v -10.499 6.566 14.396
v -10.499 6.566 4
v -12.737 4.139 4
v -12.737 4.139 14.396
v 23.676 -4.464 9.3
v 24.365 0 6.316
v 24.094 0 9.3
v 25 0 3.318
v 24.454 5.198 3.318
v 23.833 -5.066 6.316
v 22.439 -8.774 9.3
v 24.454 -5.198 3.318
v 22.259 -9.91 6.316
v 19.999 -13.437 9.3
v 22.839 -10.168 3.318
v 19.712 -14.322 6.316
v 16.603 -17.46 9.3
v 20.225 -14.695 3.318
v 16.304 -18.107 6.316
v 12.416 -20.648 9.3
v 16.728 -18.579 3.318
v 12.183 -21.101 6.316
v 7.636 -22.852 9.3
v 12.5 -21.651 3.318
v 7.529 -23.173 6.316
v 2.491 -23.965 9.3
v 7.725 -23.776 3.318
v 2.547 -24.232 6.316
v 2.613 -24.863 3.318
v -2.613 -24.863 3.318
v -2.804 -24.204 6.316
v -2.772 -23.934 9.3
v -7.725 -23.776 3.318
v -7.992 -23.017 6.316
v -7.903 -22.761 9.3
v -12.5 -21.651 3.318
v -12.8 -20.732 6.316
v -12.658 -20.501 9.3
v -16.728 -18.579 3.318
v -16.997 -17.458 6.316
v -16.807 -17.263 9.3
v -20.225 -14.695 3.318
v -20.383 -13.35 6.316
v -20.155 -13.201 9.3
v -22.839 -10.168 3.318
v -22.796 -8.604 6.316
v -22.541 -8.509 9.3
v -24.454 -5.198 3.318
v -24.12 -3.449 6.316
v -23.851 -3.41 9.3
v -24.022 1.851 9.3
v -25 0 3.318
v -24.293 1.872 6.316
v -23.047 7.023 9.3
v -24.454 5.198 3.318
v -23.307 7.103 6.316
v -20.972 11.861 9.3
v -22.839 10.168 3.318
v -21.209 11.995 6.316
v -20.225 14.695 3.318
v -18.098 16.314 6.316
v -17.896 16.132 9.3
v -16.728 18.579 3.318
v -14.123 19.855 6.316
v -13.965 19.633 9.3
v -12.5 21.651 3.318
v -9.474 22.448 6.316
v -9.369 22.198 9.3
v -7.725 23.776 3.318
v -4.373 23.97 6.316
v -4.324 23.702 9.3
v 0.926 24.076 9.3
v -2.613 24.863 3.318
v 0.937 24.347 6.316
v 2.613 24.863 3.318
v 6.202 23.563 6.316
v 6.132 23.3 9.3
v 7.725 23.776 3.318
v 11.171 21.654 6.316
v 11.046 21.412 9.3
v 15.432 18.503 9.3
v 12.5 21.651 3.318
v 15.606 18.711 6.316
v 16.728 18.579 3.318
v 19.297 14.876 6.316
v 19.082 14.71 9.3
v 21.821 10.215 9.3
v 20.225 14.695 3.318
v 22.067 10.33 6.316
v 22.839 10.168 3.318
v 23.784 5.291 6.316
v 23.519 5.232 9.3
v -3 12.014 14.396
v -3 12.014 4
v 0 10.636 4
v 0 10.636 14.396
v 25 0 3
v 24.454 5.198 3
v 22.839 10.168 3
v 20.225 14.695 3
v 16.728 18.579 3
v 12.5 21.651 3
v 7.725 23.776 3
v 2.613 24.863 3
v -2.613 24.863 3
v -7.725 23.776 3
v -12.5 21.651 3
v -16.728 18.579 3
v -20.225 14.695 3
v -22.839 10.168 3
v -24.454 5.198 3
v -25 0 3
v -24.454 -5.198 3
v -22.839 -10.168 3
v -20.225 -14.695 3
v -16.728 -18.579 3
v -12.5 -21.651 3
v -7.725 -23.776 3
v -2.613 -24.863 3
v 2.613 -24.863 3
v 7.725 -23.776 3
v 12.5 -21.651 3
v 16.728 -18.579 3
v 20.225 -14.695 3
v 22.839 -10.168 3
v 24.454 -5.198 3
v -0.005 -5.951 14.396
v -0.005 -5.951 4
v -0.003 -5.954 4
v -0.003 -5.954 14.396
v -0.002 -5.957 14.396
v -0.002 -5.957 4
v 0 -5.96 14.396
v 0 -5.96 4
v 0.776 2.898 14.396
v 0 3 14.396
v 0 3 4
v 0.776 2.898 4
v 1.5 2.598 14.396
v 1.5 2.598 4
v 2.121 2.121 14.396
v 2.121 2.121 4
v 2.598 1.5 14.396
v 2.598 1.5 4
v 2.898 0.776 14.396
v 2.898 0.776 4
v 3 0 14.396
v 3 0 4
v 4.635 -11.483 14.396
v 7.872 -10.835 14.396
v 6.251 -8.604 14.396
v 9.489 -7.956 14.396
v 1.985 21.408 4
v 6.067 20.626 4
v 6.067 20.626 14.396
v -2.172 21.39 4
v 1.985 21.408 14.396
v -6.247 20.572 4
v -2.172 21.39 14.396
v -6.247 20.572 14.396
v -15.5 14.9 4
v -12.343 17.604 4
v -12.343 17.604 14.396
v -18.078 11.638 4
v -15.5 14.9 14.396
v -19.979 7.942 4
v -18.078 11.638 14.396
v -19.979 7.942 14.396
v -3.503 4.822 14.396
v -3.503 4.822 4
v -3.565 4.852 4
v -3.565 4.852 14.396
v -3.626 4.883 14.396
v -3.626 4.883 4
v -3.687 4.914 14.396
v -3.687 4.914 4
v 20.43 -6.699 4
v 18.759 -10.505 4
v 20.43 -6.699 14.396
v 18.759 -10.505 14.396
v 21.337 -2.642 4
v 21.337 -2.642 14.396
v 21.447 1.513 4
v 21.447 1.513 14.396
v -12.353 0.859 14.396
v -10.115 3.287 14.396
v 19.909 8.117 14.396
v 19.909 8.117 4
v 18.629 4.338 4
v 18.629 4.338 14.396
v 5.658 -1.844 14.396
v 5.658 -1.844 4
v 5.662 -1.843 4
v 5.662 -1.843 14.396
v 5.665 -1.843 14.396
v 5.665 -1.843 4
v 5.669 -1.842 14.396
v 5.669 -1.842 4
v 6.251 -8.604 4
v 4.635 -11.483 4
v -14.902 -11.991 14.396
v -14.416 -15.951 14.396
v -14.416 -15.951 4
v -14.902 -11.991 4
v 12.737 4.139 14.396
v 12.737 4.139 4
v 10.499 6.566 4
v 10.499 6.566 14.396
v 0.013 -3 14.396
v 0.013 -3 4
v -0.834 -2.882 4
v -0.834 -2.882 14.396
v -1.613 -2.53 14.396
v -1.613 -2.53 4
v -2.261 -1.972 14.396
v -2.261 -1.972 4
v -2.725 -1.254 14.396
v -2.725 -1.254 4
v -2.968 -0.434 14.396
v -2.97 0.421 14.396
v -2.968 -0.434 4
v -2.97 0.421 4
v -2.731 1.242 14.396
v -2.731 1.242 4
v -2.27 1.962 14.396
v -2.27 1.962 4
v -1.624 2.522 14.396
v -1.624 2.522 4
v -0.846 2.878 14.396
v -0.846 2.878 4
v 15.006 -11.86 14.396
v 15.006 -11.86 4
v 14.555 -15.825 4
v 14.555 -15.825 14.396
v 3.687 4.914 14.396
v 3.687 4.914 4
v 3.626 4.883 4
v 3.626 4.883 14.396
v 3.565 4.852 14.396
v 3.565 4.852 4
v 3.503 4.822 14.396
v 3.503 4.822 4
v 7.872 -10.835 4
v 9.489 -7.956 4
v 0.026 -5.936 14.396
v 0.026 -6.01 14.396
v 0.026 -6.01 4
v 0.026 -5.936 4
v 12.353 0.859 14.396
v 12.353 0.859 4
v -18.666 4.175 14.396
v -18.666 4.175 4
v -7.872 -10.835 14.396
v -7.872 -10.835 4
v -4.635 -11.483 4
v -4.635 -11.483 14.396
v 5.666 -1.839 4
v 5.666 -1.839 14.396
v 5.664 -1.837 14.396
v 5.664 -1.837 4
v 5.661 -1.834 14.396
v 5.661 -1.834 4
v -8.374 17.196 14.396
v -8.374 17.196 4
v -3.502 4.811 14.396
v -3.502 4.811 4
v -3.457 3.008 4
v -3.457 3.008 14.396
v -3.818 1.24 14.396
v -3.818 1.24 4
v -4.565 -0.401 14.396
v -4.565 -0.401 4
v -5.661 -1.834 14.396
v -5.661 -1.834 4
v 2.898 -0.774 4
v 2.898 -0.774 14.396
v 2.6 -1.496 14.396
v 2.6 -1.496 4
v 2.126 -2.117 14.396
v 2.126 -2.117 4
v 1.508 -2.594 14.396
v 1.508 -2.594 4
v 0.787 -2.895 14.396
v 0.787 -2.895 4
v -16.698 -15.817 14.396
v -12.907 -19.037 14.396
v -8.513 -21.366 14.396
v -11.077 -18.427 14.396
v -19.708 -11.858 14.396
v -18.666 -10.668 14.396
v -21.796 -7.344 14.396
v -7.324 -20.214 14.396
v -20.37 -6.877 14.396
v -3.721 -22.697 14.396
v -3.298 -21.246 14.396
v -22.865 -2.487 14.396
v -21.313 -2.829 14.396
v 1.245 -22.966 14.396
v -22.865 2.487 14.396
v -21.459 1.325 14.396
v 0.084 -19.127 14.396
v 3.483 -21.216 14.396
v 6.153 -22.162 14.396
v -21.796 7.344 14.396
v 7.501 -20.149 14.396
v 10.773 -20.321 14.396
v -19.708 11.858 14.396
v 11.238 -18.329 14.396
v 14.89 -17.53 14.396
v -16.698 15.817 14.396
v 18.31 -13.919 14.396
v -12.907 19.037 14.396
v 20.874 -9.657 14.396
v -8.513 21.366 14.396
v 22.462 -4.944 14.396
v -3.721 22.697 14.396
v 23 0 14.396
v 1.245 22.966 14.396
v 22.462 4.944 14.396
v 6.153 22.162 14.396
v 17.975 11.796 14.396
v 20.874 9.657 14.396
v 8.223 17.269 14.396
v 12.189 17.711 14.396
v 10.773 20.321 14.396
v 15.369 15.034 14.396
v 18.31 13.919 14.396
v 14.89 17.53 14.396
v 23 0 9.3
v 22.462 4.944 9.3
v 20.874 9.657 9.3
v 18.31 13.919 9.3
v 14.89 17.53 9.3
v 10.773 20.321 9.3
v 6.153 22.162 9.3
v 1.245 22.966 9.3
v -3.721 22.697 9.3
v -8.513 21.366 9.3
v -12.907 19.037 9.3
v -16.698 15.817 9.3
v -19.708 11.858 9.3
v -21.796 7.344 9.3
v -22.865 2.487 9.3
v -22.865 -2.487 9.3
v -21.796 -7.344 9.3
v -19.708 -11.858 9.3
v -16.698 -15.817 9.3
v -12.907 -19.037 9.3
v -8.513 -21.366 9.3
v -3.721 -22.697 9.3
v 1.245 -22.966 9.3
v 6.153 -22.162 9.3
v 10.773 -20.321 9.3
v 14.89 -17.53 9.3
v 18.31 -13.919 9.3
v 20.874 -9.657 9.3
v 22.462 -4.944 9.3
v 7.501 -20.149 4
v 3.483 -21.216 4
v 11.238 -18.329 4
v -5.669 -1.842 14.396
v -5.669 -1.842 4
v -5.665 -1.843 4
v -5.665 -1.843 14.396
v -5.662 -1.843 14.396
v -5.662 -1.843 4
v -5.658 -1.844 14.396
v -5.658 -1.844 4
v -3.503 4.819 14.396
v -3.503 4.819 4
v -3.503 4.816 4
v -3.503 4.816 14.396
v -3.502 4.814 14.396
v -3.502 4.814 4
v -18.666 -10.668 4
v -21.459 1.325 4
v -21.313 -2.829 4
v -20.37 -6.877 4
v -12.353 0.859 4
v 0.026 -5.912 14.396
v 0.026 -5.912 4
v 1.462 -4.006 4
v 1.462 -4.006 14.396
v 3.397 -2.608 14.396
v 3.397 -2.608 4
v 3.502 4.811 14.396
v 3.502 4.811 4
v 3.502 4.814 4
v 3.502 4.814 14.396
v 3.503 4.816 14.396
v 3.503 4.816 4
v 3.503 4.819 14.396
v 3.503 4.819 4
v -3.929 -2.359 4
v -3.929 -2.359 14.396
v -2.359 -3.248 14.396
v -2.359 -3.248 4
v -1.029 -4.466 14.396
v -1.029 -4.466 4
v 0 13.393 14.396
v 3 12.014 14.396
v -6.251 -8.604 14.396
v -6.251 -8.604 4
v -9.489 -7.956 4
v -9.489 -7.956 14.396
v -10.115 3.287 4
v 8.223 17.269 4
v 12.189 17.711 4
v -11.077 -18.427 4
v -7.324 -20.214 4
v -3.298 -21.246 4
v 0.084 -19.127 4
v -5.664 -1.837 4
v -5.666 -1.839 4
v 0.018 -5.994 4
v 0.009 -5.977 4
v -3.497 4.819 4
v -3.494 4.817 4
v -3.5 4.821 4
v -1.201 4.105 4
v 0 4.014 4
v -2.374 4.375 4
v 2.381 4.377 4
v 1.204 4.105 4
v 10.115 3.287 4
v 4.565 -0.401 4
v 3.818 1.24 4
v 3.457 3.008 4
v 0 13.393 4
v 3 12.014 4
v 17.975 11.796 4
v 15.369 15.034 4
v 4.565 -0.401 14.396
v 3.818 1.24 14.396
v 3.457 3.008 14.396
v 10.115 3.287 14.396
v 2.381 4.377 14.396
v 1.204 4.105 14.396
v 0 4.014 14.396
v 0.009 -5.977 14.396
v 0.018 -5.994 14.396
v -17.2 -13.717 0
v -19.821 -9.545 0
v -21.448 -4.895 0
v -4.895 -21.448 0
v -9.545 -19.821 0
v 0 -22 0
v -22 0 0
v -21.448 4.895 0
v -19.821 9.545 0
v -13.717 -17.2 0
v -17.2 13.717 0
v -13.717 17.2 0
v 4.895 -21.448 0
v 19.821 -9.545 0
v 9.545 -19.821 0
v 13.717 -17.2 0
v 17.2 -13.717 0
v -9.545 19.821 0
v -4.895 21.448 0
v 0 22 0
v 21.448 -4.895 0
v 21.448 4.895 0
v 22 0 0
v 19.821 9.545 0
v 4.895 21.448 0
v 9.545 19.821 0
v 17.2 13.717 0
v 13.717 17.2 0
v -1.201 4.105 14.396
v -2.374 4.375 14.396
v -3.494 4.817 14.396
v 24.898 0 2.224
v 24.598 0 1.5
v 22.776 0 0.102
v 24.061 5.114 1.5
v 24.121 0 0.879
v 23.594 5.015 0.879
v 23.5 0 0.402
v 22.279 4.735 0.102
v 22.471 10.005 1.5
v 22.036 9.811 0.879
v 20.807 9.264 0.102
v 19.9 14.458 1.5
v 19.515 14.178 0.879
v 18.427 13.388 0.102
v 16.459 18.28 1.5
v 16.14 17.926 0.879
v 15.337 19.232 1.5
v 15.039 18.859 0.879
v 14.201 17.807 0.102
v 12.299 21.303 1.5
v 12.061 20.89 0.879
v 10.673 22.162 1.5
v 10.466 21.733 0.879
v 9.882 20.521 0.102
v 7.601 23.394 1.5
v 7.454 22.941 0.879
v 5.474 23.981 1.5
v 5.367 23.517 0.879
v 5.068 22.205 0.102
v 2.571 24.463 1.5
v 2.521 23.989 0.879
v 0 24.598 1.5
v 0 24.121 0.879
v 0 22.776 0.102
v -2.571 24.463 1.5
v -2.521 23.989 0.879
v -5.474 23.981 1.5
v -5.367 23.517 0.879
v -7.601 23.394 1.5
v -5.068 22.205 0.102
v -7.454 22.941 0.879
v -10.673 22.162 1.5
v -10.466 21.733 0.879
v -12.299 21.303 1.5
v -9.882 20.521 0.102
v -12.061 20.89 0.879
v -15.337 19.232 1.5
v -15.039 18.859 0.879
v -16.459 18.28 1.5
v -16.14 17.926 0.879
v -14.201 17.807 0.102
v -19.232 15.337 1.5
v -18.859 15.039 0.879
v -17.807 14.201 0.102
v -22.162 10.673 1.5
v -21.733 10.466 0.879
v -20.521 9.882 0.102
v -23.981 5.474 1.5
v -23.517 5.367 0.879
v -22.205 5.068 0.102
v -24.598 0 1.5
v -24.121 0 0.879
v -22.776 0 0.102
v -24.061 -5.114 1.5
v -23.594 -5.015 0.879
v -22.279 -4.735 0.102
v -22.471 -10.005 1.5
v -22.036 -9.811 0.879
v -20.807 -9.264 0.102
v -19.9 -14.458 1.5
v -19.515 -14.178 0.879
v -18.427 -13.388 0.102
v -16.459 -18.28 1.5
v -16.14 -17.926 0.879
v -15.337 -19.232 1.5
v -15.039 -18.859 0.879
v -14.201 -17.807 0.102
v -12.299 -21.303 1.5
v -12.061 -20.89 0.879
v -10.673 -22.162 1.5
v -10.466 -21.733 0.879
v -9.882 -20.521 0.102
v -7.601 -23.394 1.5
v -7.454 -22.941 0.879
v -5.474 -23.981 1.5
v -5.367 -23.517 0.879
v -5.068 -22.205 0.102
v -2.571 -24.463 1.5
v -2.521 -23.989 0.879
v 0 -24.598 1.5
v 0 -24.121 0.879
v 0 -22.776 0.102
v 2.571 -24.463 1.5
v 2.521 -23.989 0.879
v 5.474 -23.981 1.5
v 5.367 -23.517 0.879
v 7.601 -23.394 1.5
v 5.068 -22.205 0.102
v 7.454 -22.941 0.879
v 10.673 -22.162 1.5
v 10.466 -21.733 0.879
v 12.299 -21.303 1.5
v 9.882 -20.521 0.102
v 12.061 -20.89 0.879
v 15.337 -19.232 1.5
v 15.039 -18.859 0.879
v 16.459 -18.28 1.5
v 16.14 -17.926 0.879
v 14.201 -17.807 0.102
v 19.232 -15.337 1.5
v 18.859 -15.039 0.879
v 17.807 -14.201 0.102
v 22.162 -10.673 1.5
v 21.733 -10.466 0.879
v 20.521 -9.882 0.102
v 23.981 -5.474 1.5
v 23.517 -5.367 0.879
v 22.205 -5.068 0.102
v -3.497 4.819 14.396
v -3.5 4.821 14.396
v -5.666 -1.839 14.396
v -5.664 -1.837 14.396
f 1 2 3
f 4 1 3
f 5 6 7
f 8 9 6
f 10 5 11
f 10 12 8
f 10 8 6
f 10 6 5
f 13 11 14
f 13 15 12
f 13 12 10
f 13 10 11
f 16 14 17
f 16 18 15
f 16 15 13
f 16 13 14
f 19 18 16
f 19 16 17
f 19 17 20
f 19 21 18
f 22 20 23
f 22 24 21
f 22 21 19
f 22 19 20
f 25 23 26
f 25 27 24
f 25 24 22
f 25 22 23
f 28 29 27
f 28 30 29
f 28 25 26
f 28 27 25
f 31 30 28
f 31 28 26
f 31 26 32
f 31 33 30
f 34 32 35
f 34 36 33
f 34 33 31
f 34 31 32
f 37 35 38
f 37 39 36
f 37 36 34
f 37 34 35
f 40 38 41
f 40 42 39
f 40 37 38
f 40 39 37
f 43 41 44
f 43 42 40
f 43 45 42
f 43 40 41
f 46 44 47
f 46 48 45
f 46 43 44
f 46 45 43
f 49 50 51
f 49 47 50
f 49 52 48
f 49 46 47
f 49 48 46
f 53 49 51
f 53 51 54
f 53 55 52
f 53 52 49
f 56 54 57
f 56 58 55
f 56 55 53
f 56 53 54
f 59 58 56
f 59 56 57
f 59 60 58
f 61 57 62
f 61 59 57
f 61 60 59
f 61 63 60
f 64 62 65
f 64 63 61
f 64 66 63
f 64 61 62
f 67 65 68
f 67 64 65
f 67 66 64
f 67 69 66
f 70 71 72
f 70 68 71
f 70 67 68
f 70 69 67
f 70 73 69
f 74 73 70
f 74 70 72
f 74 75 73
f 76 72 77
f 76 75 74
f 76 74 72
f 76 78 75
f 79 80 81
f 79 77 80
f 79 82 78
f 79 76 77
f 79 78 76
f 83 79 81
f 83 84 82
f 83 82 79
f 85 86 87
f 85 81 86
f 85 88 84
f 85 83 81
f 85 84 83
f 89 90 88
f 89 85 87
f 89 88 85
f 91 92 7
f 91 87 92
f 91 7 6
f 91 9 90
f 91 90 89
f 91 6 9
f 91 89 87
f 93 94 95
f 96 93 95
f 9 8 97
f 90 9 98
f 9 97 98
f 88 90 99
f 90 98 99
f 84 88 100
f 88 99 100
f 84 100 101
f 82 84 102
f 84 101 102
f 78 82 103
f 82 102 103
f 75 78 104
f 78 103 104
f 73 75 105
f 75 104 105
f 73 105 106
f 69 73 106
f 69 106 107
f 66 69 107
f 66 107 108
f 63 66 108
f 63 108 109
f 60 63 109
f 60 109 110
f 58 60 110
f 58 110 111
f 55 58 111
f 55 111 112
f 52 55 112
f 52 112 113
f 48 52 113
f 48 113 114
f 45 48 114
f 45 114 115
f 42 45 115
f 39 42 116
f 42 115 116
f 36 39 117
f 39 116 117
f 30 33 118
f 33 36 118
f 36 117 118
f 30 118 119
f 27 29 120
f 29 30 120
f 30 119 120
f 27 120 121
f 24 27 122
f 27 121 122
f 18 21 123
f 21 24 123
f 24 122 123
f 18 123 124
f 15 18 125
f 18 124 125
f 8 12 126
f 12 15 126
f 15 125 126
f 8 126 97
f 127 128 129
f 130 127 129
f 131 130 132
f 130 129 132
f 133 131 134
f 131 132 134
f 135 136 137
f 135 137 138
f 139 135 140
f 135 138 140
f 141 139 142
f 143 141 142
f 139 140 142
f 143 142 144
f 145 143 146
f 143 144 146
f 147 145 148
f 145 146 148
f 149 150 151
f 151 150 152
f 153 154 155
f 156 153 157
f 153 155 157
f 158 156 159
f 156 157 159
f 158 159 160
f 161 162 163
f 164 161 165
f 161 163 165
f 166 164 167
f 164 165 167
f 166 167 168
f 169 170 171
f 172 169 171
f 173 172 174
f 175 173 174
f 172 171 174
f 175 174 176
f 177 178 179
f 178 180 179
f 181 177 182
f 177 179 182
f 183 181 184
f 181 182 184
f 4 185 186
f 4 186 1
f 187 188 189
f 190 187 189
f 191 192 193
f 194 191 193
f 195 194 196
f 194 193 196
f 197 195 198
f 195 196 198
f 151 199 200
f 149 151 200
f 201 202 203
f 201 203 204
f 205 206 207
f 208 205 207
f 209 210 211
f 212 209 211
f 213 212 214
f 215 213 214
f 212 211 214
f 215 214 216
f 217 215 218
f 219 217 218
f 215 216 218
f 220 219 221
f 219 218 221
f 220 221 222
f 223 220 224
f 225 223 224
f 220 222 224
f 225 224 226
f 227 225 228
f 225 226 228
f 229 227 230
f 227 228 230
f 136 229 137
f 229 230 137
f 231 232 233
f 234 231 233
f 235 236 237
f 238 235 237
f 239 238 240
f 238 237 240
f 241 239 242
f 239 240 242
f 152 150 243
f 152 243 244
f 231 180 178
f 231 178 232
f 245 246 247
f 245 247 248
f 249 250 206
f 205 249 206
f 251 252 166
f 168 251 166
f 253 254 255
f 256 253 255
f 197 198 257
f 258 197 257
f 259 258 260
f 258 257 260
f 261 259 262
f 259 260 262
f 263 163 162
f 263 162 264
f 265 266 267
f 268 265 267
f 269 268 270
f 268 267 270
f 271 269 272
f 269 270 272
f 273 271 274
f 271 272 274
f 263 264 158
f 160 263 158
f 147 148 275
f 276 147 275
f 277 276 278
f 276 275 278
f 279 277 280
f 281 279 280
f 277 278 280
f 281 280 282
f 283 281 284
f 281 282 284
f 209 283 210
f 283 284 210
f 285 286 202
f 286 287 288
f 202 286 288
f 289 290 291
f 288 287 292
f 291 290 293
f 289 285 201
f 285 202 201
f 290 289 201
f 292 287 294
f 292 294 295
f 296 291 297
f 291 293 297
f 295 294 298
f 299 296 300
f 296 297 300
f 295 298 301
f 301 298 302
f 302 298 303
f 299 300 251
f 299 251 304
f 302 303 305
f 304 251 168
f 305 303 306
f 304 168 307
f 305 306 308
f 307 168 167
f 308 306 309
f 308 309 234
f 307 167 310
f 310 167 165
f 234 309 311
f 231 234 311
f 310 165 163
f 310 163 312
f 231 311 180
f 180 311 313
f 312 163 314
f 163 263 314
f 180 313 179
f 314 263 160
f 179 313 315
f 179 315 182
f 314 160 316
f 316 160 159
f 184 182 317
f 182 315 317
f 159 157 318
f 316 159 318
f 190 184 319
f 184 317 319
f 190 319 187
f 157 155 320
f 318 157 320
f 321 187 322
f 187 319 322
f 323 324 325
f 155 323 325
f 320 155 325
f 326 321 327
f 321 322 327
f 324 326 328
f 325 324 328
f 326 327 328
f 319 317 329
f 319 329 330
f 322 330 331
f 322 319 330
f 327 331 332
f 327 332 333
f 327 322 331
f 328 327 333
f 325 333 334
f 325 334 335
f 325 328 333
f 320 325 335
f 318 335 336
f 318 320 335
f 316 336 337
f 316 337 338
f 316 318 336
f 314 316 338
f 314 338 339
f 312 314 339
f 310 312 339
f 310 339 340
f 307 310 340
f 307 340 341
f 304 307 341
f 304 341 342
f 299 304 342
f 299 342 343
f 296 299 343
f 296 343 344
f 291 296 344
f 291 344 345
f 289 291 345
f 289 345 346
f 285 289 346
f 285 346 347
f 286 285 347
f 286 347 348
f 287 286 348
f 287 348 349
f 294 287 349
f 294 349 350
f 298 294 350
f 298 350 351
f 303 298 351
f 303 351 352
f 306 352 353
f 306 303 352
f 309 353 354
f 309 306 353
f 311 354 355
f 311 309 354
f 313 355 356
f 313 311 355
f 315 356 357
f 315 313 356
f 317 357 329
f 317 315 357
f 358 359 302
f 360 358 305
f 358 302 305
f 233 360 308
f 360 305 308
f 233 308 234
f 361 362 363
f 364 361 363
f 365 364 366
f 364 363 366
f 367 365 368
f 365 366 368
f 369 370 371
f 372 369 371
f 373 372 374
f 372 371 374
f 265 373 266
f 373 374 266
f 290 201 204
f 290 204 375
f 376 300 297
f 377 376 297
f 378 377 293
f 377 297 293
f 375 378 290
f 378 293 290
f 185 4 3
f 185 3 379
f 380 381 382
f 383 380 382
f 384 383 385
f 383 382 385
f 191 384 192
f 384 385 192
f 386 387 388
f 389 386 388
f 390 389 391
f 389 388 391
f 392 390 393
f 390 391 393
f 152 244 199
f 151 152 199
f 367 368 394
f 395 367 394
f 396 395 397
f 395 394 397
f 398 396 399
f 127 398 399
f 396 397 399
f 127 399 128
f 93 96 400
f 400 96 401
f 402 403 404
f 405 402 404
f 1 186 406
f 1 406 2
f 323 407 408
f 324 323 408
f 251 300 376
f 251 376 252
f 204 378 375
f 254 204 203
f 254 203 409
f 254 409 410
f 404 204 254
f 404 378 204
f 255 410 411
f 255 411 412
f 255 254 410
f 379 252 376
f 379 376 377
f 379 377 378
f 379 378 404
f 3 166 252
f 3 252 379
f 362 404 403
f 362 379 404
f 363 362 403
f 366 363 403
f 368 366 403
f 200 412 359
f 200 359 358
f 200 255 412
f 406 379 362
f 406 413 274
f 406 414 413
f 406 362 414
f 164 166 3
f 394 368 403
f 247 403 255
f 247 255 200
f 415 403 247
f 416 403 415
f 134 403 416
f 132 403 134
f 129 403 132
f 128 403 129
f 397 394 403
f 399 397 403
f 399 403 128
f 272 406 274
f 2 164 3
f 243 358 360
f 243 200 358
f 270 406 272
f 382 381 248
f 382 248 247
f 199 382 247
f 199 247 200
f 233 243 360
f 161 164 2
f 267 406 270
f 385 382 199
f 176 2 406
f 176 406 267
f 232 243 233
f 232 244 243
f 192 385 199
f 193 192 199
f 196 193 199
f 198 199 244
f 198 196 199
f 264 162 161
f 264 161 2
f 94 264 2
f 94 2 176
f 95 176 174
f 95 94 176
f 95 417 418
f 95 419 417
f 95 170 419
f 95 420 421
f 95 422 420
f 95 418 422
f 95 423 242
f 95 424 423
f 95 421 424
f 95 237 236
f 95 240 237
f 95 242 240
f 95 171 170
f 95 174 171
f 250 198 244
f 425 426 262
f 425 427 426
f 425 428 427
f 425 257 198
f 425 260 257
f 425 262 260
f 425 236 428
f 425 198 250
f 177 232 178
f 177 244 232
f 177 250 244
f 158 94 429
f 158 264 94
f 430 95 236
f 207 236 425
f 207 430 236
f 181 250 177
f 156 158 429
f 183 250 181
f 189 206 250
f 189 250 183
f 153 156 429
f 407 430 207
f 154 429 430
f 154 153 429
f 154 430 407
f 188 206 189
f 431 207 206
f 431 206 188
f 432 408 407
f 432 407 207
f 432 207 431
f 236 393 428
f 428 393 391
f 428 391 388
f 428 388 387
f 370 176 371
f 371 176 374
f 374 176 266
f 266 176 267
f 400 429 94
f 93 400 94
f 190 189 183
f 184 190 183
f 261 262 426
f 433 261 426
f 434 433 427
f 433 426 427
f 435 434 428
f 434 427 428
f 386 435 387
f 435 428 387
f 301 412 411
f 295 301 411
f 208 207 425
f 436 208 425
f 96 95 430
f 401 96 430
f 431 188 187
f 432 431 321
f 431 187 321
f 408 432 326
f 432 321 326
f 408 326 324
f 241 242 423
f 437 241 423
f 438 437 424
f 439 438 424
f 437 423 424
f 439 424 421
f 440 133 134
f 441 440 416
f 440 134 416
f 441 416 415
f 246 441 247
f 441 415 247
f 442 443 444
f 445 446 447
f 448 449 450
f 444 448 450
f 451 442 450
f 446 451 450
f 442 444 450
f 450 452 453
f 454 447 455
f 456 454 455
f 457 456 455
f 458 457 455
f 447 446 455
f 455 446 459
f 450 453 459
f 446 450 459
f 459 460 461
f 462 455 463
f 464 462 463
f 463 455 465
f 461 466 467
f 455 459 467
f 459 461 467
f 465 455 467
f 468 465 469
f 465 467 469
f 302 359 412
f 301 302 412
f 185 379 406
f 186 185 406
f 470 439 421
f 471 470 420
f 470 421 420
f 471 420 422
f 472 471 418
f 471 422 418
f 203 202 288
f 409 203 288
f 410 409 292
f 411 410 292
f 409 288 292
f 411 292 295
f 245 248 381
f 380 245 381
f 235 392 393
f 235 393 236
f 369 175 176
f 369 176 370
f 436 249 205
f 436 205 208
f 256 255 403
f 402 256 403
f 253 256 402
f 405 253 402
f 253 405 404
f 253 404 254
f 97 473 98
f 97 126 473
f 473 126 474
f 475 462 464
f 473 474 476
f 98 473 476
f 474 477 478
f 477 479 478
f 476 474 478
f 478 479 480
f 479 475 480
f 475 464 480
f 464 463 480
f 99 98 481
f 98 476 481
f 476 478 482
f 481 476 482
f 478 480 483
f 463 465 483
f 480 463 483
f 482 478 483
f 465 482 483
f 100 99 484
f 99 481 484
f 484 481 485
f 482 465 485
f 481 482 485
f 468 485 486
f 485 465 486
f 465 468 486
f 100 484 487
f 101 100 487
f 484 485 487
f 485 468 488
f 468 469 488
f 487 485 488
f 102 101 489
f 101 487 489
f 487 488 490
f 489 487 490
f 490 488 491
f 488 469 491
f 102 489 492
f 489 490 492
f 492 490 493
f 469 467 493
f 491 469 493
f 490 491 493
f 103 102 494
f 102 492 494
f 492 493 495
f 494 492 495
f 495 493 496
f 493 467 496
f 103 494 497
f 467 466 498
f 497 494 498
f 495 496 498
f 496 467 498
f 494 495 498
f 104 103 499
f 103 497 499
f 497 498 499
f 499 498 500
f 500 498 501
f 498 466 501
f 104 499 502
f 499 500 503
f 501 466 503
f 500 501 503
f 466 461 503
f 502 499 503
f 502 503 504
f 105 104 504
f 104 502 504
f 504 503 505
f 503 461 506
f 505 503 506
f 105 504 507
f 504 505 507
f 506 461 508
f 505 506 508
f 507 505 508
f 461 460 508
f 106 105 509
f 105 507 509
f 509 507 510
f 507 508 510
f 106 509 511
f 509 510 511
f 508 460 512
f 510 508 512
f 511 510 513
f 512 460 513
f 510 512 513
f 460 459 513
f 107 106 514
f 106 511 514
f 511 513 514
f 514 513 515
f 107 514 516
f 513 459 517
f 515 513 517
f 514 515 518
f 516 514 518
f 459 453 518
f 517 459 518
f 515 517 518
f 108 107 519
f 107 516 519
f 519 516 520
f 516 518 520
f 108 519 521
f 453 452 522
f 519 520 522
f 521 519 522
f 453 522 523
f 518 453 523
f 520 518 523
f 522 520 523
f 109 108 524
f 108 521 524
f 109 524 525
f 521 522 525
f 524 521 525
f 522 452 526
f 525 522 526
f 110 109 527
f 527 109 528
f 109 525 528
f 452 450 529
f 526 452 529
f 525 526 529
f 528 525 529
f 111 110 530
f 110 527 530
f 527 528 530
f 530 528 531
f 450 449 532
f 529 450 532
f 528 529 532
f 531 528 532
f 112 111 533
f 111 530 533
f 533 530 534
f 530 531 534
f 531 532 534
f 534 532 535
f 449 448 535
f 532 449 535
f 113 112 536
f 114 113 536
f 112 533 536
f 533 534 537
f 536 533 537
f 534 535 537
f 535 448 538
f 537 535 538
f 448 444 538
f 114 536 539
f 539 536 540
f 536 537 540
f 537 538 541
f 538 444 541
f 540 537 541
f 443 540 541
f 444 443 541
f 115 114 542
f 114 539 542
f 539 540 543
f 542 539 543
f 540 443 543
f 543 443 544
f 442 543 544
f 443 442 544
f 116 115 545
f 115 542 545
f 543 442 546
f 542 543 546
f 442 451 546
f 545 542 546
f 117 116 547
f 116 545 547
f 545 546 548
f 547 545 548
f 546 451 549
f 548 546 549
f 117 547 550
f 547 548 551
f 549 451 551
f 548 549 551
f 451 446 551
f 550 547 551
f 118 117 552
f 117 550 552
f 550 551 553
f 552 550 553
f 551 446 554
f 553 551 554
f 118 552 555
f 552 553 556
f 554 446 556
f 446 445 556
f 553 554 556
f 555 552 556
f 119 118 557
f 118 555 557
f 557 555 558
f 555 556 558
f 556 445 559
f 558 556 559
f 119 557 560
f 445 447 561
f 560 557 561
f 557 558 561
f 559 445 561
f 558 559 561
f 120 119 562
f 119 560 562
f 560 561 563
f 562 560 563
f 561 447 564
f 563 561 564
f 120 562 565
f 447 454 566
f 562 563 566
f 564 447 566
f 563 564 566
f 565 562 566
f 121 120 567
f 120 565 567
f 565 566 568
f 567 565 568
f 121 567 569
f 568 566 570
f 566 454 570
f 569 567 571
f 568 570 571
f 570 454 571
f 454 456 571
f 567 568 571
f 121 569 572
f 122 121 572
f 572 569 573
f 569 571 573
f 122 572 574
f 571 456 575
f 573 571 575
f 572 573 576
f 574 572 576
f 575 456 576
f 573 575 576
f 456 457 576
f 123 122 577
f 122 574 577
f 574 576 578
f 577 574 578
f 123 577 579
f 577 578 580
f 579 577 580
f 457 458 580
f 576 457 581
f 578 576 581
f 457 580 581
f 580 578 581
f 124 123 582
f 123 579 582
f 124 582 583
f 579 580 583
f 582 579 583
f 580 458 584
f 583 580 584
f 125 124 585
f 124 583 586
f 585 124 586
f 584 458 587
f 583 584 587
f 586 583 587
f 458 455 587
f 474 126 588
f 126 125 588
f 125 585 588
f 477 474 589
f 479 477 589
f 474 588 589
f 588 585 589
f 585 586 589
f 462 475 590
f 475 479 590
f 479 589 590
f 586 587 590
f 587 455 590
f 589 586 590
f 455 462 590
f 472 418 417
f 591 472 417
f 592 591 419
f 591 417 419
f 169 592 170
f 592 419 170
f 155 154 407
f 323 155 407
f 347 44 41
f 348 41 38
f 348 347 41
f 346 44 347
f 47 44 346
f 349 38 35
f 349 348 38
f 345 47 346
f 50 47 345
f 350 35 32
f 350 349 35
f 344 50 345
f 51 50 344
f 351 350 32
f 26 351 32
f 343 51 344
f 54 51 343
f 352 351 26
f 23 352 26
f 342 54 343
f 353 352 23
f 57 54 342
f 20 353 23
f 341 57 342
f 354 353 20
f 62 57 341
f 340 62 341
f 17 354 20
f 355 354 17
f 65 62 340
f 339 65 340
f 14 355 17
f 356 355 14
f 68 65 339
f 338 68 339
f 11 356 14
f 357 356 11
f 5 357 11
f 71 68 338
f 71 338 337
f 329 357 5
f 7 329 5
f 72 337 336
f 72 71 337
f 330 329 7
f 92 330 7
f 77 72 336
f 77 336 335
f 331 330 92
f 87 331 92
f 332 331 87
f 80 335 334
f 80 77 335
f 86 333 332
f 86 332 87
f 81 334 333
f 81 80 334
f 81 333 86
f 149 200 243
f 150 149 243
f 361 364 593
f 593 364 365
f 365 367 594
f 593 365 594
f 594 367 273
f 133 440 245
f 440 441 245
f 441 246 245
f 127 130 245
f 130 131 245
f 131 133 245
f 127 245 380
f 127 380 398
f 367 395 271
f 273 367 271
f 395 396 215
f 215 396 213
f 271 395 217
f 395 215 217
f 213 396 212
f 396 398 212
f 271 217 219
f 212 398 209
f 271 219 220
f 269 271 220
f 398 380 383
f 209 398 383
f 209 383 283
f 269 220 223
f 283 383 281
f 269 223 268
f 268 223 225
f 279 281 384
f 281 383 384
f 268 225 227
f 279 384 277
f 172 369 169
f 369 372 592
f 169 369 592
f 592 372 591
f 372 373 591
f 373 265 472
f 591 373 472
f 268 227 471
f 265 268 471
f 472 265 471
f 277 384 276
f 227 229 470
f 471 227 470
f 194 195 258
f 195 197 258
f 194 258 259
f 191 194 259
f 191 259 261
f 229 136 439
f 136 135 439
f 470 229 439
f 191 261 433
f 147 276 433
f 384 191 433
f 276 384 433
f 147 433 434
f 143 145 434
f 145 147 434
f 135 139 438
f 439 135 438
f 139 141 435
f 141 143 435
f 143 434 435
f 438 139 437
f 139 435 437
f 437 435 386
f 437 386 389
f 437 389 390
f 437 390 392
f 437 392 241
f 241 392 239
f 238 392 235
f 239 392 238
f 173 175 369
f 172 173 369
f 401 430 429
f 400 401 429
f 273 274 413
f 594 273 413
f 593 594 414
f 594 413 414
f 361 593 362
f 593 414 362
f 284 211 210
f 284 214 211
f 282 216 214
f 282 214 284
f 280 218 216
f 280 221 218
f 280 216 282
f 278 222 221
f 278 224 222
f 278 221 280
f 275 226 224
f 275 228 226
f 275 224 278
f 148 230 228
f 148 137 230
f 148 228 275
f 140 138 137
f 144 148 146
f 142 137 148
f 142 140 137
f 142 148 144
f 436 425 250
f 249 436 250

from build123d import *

# Parameters (mm, degrees)
F0_R      = 25
F1_DEPTH  = 15
F2_R      = 3
F5_R      = 21.5
F6_DEPTH  = 11
F8_DEPTH  = 10.8
F9_R      = 26.2697313625
F9_R_2    = 23
F10_DEPTH = 5.7
F11_W     = 62.843285501
F11_H     = 17.6012022421
F12_DEPTH = 30


with BuildPart() as f1:
    # F0 (on Top) → F1 (new body)
    with BuildSketch(Plane.XY):
        Circle(F0_R)
    extrude(amount=F1_DEPTH)

    # F2
    f2_edges = [f1.edges().sort_by_distance(p)[0] for p in [
        (-25, 0, 0),
    ]]
    fillet(f2_edges, radius=F2_R)

    # F3 (on Front) → F4 (revolve, cut)
    with BuildSketch(Plane.XZ):
        with BuildLine():
            Line((27.423677966, 5.2825664575), (25, 14.9365440011))
            add(Edge.make_bspline(
                [(25, 14.9365440011), (24.5482466845, 13.0284596048), (23.6395446157, 9.1903466819), (24.5447896478, 5.2825664575), (25, 3.3175051212)],
                knots=[0, 0, 0, 0, 0.4971412865, 1, 1, 1, 1], degree=3))
            Line((25, 3.3175051212), (27.423677966, 5.2825664575))
        make_face()
    revolve(axis=Axis((0, 0, 20.2008970082), (0, 0, -1)), mode=Mode.SUBTRACT)

    # F5 (on face) → F6 (cut)
    with BuildSketch(Plane.XY.offset(15)):
        Circle(F5_R)
    extrude(amount=-F6_DEPTH, mode=Mode.SUBTRACT)

    # F7 (on face) → F8 (join)
    with BuildSketch(Plane.XY.offset(4)):
        with BuildLine():
            Line((-3.5030060365, 4.8188975732), (-3.5, 4.8173367216))
            Line((-3.5, 4.8173367216), (-3.4936811056, 4.8173367216))
            ThreePointArc((-3.4936811056, 4.8173367216), (-3.4985674675, 4.8197108468), (-3.5034522162, 4.8220882896))
            ThreePointArc((-3.5034522162, 4.8220882896), (-3.5032289657, 4.8204929538), (-3.5030060365, 4.8188975732))
        make_face()
        with BuildLine():
            Line((-3.5019526458, 4.8113270959), (-3.5, 4.8173367216))
            Line((-3.5, 4.8173367216), (-3.5030060365, 4.8188975732))
            ThreePointArc((-3.5030060365, 4.8188975732), (-3.502478437, 4.8151124604), (-3.5019526458, 4.8113270959))
        make_face()
        with BuildLine():
            Line((-3.4936811056, 4.8173367216), (-3.5, 4.8173367216))
            Line((-3.5, 4.8173367216), (-3.5019526458, 4.8113270959))
            ThreePointArc((-3.5019526458, 4.8113270959), (-3.8176882042, 1.2404420916), (-5.6611663149, -1.8340492667))
            Line((-5.6611663149, -1.8340492667), (-5.6631189606, -1.8400588924))
            Line((-5.6631189606, -1.8400588924), (-5.6580068676, -1.8437730454))
            ThreePointArc((-5.6580068676, -1.8437730454), (-2.3594610686, -3.2475195569), (-0.005112093, -5.9508415055))
            Line((-0.005112093, -5.9508415055), (0, -5.9545556585))
            Line((0, -5.9545556585), (0.005112093, -5.9508415055))
            ThreePointArc((0.005112093, -5.9508415055), (0.0154537536, -5.9315416501), (0.025848199, -5.912270172))
            Line((0.025848199, -5.912270172), (0.0131157498, -2.9999713294))
            ThreePointArc((0.0131157498, -2.9999713294), (-2.9999928323, -0.0065578905), (0, 3))
            Line((0, 3), (0, 4.0141549306))
            ThreePointArc((0, 4.0141549306), (-1.7924082025, 4.2175356096), (-3.4936811056, 4.8173367216))
        make_face()
        Polygon((-3, 12.0141549306), (0, 10.6355519965), (0, 12.0141549306), (3, 12.0141549306), (0, 13.3927578647), align=None)
        Polygon((0, 12.0141549306), (0, 10.6355519965), (3, 12.0141549306), align=None)
        Polygon((3.9177863585, -21.4830770759), (0.0836216544, -19.1268185495), (0.0939962066, -21.4997945272), align=None)
        Polygon((0.0939962066, -21.4997945272), (0.0836216544, -19.1268185495), (-3.7297939454, -21.5165119786), align=None)
        with BuildLine():
            Line((-3.6865685479, 4.9142103997), (-3.5030060365, 4.8188975732))
            ThreePointArc((-3.5030060365, 4.8188975732), (-3.5032289657, 4.8204929538), (-3.5034522162, 4.8220882896))
            ThreePointArc((-3.5034522162, 4.8220882896), (-3.5953054485, 4.8675628244), (-3.6865685479, 4.9142103997))
        make_face()
        with BuildLine():
            ThreePointArc((3.5034522162, 4.8220882896), (1.7977022656, 4.218754584), (0, 4.0141549306))
            Line((0, 4.0141549306), (0, 3))
            ThreePointArc((0, 3), (2.1213203436, 2.1213203436), (3, 0))
            ThreePointArc((3, 0), (2.1259524041, -2.1166781464), (0.0131157498, -2.9999713294))
            Line((0.0131157498, -2.9999713294), (0.025848199, -5.912270172))
            ThreePointArc((0.025848199, -5.912270172), (2.3771928926, -3.2346736711), (5.6580068676, -1.8437730454))
            Line((5.6580068676, -1.8437730454), (5.6631189606, -1.8400588924))
            Line((5.6631189606, -1.8400588924), (5.6611663149, -1.8340492667))
            ThreePointArc((5.6611663149, -1.8340492667), (3.8176882042, 1.2404420916), (3.5019526458, 4.8113270959))
            Line((3.5019526458, 4.8113270959), (3.5, 4.8173367216))
            Line((3.5, 4.8173367216), (3.5030060365, 4.8188975732))
            ThreePointArc((3.5030060365, 4.8188975732), (3.5032289657, 4.8204929538), (3.5034522162, 4.8220882896))
        make_face()
        with BuildLine():
            Line((-5.6631189606, -1.8400588924), (-5.6611663149, -1.8340492667))
            ThreePointArc((-5.6611663149, -1.8340492667), (-5.6649342109, -1.8379628281), (-5.6687047637, -1.8418738299))
            ThreePointArc((-5.6687047637, -1.8418738299), (-5.6633554933, -1.8428216215), (-5.6580068676, -1.8437730454))
            Line((-5.6580068676, -1.8437730454), (-5.6631189606, -1.8400588924))
        make_face()
        with BuildLine():
            ThreePointArc((3.6865685479, 4.9142103997), (3.5953054485, 4.8675628244), (3.5034522162, 4.8220882896))
            ThreePointArc((3.5034522162, 4.8220882896), (3.5032289657, 4.8204929538), (3.5030060365, 4.8188975732))
            Line((3.5030060365, 4.8188975732), (3.6865685479, 4.9142103997))
        make_face()
        with BuildLine():
            ThreePointArc((3.5019526458, 4.8113270959), (3.502478437, 4.8151124604), (3.5030060365, 4.8188975732))
            Line((3.5030060365, 4.8188975732), (3.5, 4.8173367216))
            Line((3.5, 4.8173367216), (3.5019526458, 4.8113270959))
        make_face()
        with BuildLine():
            Line((0.0259506395, -5.9357014153), (0.025848199, -5.912270172))
            ThreePointArc((0.025848199, -5.912270172), (0.0154537536, -5.9315416501), (0.005112093, -5.9508415055))
            Line((0.005112093, -5.9508415055), (0.0259506395, -5.9357014153))
        make_face()
        with BuildLine():
            Line((0, -5.9545556585), (-0.005112093, -5.9508415055))
            ThreePointArc((-0.005112093, -5.9508415055), (-0.0025544188, -5.9556343446), (0, -5.9604289194))
            ThreePointArc((0, -5.9604289194), (0.0025544188, -5.9556343446), (0.005112093, -5.9508415055))
            Line((0.005112093, -5.9508415055), (0, -5.9545556585))
        make_face()
        with BuildLine():
            ThreePointArc((5.6687047637, -1.8418738299), (5.6649342109, -1.8379628281), (5.6611663149, -1.8340492667))
            Line((5.6611663149, -1.8340492667), (5.6631189606, -1.8400588924))
            Line((5.6631189606, -1.8400588924), (5.6580068676, -1.8437730454))
            ThreePointArc((5.6580068676, -1.8437730454), (5.6633554933, -1.8428216215), (5.6687047637, -1.8418738299))
        make_face()
        with BuildLine():
            Line((0.0259506395, -5.9357014153), (0.005112093, -5.9508415055))
            ThreePointArc((0.005112093, -5.9508415055), (0.0025544188, -5.9556343446), (0, -5.9604289194))
            ThreePointArc((0, -5.9604289194), (0.0131819815, -5.9852967616), (0.0262763915, -6.0102108267))
            Line((0.0262763915, -6.0102108267), (0.0259506395, -5.9357014153))
        make_face()
        Polygon((-12.7372696383, 4.1385897817), (-12.3531913176, 0.8594084977), (-10.1150110307, 3.2865663115), (-10.4990893514, 6.5657475955), align=None)
        Polygon((-7.8720655604, -10.8349687141), (-4.6346921038, -11.4830112688), (-6.2514206135, -8.6043423098), (-9.4887940701, -7.956299755), align=None)
        Polygon((7.8720655604, -10.8349687141), (9.4887940701, -7.956299755), (6.2514206135, -8.6043423098), (4.6346921038, -11.4830112688), align=None)
        Polygon((12.7372696383, 4.1385897817), (10.4990893514, 6.5657475955), (10.1150110307, 3.2865663115), (12.3531913176, 0.8594084977), align=None)
        Polygon((16.8678219042, -13.3314134363), (19.2388458386, -10.3314307527), (15.0060861502, -11.8599982656), (14.4967979698, -16.3313961198), align=None)
        Polygon((20.9398336671, 4.8757938835), (20.0726620013, 8.5999936501), (18.6286617065, 4.3376426122), (21.8070053329, 1.1515941169), align=None)
        Polygon((9.2437235839, 19.4114289609), (5.7913542693, 21.0554474264), (8.2234750424, 17.2689501312), (12.6960928985, 17.7674104954), align=None)
        Polygon((-9.4130988956, 19.3298621098), (-12.8509613495, 17.6557198378), (-8.374156057, 17.1963859791), (-5.9752364416, 21.0040043817), align=None)
        Polygon((-20.9816659144, 4.6925148326), (-21.8162409604, 0.9608751003), (-18.6658768438, 4.1745924423), (-20.1470908685, 8.424154565), align=None)
        Polygon((-16.7506105518, -13.4783918233), (-14.3534461578, -16.457528186), (-14.9018116527, -11.9907543496), (-19.1477749457, -10.4992554606), align=None)
    extrude(amount=F8_DEPTH)

    # F9 (on face) → F10 (cut)
    with BuildSketch(Plane.XY.offset(15)):
        Circle(F9_R)
        Circle(F9_R_2, mode=Mode.SUBTRACT)
    extrude(amount=-F10_DEPTH, mode=Mode.SUBTRACT)

    # F11 (on Right) → F12 (cut, symmetric)
    with BuildSketch(Plane.YZ):
        with Locations((-2.5946311653, 23.1964425184)):
            Rectangle(F11_W, F11_H)
    extrude(amount=F12_DEPTH, both=True, mode=Mode.SUBTRACT)


solid = f1.part
